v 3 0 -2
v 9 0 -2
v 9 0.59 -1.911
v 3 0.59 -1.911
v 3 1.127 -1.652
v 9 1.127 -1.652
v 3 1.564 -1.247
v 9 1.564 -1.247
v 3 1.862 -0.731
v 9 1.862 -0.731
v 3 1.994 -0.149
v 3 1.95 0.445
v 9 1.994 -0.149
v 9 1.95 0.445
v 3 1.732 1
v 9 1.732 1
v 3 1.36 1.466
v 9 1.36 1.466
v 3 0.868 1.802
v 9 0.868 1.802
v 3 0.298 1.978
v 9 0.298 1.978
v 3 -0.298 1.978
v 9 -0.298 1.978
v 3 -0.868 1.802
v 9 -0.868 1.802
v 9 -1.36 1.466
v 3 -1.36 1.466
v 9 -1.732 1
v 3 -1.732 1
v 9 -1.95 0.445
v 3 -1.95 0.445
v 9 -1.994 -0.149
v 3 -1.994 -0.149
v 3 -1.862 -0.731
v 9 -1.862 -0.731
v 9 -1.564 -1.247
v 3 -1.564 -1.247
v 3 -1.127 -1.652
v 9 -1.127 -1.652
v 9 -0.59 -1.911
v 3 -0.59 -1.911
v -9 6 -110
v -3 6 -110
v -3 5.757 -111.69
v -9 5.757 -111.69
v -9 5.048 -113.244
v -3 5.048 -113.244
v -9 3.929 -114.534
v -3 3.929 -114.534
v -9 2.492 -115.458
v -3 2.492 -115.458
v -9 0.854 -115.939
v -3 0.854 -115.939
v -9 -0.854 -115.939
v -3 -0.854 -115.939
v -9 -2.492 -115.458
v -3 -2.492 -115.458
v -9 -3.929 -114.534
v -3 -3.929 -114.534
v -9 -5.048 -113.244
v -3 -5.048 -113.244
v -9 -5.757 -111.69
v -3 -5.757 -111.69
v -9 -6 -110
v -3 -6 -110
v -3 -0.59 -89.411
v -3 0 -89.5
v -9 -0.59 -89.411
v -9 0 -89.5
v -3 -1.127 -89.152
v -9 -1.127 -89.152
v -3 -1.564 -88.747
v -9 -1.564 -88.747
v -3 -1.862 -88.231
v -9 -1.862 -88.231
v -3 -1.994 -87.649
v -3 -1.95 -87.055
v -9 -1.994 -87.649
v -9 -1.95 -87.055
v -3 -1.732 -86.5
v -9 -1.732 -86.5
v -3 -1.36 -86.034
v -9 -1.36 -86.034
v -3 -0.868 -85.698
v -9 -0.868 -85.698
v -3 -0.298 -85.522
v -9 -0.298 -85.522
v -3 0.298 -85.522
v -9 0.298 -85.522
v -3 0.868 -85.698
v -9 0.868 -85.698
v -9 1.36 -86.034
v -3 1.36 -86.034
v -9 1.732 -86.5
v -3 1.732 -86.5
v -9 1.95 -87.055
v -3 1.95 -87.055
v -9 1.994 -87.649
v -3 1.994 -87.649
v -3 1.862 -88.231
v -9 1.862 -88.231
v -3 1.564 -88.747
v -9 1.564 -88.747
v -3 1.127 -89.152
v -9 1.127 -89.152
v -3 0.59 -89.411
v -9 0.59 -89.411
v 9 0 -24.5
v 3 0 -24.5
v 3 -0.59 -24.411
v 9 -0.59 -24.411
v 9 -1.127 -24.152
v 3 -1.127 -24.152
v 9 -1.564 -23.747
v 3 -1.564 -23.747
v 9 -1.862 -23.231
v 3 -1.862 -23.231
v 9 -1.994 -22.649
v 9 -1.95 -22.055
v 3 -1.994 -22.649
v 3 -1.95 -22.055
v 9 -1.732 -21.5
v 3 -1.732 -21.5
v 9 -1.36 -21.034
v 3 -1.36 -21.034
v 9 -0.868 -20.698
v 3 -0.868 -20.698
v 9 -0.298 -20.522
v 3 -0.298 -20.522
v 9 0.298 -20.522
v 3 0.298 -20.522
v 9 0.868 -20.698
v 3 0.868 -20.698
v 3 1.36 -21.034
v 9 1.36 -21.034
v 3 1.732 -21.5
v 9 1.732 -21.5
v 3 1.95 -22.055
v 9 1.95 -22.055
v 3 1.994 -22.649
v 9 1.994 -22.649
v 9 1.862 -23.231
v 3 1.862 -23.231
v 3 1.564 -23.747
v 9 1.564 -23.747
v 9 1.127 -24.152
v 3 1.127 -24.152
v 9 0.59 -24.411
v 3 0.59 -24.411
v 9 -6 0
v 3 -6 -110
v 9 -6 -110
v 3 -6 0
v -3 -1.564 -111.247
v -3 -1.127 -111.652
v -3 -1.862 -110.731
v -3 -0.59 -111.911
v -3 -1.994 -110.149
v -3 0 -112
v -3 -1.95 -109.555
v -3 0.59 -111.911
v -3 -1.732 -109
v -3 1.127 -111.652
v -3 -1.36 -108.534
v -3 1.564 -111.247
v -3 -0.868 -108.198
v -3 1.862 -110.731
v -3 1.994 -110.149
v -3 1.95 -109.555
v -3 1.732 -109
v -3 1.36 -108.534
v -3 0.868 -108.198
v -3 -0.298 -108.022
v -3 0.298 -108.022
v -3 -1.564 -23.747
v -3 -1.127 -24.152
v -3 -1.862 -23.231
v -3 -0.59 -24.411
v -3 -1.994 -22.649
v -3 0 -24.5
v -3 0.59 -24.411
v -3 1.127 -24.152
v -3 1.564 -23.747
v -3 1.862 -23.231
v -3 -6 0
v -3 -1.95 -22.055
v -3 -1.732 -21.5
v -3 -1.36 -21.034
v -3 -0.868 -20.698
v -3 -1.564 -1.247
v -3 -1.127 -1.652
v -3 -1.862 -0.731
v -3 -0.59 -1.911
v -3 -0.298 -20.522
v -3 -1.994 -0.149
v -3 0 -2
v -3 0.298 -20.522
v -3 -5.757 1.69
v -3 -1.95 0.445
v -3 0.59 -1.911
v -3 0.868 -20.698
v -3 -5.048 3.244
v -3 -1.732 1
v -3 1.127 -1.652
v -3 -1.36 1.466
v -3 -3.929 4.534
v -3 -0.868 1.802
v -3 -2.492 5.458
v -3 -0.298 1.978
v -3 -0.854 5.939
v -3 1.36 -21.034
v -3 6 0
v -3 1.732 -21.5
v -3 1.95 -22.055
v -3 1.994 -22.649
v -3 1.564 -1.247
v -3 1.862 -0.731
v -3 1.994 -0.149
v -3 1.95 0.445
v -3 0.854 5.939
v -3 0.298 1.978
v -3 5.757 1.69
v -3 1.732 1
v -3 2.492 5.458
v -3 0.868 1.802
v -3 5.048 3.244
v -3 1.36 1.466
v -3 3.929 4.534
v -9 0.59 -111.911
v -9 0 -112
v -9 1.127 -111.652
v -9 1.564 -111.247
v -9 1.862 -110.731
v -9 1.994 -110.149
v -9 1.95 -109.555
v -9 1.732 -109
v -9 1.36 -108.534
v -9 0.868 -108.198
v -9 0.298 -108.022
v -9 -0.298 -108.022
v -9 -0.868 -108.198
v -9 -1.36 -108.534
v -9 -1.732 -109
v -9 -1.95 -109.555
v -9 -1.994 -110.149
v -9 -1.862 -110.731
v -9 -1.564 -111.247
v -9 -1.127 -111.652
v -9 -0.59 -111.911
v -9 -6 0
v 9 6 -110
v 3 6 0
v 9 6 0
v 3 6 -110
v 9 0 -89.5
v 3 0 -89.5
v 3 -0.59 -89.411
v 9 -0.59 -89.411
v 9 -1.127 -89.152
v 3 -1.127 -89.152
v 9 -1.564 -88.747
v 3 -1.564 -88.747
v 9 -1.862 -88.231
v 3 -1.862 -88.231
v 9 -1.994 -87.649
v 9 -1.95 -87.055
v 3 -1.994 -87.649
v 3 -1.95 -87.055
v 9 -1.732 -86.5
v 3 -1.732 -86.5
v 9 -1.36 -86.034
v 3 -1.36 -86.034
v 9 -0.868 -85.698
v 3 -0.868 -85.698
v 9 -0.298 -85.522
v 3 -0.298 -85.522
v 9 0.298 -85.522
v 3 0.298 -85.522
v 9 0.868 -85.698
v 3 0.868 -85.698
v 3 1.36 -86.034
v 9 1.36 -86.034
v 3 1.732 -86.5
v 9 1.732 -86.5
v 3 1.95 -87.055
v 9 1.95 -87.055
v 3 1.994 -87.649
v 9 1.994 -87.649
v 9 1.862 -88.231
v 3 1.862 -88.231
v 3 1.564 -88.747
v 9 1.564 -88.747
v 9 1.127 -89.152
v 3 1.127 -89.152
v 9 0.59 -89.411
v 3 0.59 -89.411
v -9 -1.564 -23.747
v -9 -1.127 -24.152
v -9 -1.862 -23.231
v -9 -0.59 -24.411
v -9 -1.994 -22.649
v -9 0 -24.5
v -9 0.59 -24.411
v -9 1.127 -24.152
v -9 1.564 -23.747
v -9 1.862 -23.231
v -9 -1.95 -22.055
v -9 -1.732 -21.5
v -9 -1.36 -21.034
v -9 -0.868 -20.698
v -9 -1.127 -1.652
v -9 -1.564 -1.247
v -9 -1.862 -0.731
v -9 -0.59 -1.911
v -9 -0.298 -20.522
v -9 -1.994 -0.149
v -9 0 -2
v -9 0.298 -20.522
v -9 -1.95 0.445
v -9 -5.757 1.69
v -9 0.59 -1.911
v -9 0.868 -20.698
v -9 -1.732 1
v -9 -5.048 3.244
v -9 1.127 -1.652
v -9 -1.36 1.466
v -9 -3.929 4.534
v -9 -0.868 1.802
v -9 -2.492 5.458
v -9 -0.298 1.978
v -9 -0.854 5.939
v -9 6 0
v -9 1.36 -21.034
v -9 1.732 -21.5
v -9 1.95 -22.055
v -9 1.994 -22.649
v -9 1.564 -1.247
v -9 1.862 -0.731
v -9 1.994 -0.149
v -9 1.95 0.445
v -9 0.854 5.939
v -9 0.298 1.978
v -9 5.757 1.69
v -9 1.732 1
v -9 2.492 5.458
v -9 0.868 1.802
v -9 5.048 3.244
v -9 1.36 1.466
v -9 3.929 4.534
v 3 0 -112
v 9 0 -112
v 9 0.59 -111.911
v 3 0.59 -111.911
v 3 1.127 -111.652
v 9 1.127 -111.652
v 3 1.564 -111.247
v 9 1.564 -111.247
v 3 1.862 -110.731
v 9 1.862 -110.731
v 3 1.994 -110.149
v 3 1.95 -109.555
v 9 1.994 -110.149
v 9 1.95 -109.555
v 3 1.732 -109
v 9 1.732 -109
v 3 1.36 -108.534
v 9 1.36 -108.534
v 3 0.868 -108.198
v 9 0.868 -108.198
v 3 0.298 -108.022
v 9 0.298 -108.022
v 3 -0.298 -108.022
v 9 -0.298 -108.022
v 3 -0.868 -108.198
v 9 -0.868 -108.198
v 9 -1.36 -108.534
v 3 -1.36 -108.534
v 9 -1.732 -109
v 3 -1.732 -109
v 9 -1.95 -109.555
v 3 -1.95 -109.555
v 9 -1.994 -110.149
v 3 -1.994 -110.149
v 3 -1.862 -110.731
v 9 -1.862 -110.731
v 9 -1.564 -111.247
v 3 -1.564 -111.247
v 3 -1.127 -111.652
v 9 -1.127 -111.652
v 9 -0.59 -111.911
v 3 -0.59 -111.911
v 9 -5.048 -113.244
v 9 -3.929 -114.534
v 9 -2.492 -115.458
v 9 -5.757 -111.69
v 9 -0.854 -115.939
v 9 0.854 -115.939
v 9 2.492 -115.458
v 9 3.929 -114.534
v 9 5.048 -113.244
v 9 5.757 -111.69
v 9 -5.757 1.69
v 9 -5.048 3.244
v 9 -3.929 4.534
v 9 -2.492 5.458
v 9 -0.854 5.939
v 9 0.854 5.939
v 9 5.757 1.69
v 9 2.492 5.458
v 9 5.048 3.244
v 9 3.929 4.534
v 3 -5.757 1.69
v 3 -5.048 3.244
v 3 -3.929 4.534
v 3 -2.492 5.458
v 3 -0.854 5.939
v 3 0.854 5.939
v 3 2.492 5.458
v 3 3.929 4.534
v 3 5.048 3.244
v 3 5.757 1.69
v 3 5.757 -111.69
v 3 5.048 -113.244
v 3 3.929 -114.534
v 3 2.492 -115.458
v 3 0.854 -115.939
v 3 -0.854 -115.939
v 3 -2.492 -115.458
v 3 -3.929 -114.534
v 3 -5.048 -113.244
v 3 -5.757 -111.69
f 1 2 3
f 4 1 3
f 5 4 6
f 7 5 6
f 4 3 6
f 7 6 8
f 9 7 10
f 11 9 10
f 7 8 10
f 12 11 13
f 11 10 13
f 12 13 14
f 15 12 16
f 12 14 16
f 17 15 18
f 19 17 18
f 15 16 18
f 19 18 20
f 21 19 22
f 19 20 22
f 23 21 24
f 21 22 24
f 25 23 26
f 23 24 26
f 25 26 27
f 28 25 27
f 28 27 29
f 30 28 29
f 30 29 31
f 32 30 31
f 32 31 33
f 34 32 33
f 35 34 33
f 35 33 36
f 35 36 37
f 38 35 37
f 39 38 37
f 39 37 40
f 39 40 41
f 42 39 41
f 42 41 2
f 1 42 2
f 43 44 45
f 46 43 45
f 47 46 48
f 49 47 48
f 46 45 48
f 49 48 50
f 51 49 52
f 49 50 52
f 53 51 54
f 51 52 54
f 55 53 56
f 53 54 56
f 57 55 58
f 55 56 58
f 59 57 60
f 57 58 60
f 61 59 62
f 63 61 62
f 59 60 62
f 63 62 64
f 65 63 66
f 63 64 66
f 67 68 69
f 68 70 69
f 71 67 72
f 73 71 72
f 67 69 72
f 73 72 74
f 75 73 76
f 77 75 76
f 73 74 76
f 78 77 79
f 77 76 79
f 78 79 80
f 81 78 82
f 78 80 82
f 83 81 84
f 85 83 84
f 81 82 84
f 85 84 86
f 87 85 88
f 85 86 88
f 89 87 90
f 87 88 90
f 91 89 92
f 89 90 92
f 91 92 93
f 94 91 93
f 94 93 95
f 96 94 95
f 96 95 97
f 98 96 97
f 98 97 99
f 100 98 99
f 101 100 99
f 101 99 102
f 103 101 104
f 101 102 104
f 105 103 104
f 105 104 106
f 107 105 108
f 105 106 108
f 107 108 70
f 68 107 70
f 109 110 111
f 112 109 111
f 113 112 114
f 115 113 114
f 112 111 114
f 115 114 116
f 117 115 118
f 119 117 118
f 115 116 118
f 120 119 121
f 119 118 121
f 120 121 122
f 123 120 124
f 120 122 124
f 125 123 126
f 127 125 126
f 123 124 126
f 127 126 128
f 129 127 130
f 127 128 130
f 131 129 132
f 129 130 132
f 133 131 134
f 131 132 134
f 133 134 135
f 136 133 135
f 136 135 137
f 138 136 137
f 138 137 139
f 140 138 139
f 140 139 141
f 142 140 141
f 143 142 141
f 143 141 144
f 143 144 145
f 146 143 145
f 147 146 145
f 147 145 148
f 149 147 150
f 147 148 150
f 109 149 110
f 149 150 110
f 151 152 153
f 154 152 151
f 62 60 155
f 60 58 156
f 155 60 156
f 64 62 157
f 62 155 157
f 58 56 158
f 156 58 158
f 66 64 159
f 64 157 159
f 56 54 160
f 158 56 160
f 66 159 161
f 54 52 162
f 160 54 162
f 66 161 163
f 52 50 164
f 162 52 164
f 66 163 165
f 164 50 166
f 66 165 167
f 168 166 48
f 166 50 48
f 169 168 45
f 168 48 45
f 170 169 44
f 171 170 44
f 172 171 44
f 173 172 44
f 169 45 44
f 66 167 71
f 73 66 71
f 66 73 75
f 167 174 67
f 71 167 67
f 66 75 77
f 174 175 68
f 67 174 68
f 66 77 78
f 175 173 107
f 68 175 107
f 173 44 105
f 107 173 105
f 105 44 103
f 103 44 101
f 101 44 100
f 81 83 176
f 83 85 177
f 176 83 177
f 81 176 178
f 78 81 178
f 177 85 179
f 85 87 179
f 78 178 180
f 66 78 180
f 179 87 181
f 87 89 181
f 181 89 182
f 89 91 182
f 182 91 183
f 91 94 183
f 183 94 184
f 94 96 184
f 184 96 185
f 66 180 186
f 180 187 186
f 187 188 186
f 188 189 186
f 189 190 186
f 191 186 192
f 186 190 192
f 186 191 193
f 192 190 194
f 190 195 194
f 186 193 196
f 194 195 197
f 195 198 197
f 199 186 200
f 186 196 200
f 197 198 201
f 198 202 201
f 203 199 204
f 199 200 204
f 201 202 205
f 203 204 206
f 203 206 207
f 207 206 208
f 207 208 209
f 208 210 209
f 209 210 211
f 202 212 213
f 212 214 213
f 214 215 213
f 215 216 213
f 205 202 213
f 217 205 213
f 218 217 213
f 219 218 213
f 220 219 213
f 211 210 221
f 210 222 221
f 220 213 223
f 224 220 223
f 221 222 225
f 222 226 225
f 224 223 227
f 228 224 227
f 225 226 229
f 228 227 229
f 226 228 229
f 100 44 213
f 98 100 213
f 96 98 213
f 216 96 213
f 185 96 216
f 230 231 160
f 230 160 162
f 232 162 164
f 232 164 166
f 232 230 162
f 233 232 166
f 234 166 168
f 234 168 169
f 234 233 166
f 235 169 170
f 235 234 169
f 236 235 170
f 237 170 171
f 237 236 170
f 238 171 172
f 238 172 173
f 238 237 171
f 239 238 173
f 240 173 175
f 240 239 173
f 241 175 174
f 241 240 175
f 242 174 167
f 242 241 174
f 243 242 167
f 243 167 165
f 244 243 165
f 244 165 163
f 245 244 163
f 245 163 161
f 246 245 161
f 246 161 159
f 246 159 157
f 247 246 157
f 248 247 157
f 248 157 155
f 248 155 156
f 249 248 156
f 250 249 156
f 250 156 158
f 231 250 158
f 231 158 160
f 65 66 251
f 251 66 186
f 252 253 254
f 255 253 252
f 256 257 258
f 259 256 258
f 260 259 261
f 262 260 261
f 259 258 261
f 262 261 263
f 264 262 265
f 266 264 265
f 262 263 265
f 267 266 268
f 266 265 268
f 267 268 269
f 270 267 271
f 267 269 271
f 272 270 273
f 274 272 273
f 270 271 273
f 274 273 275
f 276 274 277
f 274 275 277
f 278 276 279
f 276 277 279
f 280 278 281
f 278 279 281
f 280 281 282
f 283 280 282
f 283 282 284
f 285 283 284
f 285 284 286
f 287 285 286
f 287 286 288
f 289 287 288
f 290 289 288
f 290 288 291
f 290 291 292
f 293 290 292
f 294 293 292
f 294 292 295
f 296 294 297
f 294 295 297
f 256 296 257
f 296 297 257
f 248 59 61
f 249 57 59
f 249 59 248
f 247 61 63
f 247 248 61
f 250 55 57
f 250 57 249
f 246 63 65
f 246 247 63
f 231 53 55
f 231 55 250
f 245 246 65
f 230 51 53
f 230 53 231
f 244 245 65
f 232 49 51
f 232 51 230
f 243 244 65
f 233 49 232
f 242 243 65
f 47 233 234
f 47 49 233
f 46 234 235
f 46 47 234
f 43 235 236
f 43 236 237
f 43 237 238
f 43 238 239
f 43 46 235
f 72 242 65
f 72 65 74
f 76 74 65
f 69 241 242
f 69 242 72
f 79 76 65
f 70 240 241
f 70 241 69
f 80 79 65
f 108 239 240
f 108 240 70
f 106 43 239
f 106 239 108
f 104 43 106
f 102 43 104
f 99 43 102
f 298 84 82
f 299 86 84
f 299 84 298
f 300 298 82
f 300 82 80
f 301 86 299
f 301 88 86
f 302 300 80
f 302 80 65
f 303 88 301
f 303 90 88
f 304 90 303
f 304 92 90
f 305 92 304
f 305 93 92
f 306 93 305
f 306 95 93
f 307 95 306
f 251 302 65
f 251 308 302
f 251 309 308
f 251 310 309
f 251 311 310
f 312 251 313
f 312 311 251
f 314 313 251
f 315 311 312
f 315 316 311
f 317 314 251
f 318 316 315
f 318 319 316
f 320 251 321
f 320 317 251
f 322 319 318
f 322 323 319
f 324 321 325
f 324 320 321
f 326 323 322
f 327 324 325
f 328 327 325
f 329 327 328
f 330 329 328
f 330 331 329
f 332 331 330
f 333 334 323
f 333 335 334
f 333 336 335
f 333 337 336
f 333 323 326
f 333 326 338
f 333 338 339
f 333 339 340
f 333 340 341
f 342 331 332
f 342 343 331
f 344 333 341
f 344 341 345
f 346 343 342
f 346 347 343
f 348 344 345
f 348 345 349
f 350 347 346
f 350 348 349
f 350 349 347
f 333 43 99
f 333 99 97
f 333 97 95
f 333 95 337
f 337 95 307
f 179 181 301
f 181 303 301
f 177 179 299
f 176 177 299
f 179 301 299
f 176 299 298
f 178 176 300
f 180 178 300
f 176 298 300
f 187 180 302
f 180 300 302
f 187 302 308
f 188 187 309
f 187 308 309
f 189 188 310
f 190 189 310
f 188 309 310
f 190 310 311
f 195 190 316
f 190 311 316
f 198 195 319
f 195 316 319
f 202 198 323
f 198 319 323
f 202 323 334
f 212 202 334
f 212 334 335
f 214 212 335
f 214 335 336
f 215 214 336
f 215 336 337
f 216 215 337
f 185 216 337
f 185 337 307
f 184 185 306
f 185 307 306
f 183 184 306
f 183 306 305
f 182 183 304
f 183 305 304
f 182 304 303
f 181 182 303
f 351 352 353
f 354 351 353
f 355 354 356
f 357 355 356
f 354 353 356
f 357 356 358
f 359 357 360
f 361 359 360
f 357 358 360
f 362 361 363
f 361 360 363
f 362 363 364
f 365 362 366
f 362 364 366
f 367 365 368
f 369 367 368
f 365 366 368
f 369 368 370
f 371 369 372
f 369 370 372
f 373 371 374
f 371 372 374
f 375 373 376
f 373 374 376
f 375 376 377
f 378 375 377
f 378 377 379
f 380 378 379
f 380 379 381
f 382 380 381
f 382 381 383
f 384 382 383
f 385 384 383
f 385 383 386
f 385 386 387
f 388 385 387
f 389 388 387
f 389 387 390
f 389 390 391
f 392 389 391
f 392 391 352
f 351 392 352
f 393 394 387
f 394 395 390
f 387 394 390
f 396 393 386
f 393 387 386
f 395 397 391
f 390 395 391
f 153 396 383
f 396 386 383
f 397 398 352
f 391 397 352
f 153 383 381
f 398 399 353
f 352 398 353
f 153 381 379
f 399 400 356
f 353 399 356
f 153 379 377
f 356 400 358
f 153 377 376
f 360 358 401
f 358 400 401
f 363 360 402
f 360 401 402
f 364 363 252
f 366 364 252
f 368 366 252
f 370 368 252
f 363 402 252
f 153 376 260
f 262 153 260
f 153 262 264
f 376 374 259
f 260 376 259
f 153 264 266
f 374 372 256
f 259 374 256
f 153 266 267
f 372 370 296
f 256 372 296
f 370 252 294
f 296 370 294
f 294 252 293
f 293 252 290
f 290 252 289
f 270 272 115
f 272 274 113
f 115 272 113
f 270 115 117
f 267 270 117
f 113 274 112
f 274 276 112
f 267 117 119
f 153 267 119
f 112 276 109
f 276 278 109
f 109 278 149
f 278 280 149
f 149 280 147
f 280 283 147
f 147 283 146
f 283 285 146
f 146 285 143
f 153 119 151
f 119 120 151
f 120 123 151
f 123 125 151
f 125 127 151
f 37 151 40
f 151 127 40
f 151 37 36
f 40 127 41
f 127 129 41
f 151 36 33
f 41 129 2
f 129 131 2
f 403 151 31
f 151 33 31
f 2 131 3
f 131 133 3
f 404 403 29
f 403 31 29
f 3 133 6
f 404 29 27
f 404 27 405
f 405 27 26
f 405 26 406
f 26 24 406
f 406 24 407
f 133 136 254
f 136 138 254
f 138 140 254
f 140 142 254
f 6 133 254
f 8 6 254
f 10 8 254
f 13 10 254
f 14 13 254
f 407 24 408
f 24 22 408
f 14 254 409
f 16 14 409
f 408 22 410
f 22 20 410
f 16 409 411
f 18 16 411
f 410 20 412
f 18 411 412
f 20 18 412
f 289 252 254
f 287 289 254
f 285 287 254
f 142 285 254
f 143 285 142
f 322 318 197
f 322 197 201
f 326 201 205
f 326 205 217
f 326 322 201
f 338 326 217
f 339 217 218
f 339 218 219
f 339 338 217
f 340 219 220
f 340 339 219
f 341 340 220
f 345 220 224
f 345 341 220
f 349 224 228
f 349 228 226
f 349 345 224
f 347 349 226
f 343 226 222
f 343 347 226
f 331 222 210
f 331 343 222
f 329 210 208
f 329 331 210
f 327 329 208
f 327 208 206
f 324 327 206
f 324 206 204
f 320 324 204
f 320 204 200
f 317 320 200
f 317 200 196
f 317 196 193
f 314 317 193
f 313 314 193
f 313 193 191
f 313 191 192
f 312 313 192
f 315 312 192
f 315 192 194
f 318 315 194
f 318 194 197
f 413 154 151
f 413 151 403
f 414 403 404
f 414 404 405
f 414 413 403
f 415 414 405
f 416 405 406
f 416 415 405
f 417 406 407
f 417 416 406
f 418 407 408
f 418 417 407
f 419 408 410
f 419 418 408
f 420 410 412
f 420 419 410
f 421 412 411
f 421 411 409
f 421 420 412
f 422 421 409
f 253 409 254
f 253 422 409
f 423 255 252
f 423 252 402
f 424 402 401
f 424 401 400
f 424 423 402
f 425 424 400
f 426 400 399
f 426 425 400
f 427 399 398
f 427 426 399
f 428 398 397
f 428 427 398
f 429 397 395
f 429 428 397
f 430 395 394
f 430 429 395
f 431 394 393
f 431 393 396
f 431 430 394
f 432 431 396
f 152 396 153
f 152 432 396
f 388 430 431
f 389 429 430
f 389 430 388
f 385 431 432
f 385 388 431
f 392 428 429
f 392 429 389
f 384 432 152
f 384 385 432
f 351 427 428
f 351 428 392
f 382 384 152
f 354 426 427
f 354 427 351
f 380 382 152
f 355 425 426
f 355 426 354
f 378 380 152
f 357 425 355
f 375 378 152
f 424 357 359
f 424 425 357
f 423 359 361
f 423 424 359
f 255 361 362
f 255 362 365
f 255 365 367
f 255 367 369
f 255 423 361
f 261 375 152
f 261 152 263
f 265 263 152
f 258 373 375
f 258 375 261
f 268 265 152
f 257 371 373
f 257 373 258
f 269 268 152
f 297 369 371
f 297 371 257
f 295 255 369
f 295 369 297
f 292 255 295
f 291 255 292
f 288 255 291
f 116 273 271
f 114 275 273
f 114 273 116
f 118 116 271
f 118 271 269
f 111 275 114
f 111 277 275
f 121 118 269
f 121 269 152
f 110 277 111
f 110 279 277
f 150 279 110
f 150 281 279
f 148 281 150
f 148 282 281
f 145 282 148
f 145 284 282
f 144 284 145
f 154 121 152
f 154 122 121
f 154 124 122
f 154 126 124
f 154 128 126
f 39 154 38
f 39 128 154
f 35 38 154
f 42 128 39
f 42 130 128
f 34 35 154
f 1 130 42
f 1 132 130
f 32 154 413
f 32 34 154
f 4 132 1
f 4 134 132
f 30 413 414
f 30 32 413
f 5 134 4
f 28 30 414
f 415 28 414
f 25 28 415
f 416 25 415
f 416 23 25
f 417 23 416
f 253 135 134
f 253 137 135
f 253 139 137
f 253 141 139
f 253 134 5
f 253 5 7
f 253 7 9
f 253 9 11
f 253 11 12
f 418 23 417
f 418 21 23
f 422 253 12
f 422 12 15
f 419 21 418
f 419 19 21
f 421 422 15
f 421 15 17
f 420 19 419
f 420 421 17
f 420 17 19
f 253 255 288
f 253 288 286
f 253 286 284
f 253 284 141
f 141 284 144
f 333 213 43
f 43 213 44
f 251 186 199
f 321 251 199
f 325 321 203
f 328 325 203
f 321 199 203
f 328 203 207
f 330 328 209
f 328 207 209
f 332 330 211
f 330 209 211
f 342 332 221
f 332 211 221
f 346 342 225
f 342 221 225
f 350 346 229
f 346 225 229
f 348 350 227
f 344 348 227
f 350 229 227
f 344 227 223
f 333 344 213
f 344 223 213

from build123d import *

# Parameters (mm, degrees)
BOSS_EXTRUDE1_DEPTH            = 6
SKETCH2_R                      = 2
CUT_EXTRUDE1_DEPTH             = 1
CUT_EXTRUDE1_DEPTH_BACK        = 7
SKETCH6_W                      = 2
SKETCH6_H                      = 18
F_4_0MM_DOWEL_HOLE1_AT_2_COUNT = 2
F_4_0MM_DOWEL_HOLE1_AT_2_PITCH = 65


with BuildPart() as part:
    # Sketch1 → Boss-Extrude1 (new body)
    with BuildSketch(Plane(origin=(3, 0, 0), x_dir=(0, 0, -1), z_dir=(1, 0, 0))):
        with BuildLine():
            Line((0, 6), (110, 6))
            ThreePointArc((110, 6), (116, 0), (110, -6))
            Line((110, -6), (0, -6))
            ThreePointArc((0, -6), (-6, 0), (0, 6))
        make_face()
    extrude(amount=BOSS_EXTRUDE1_DEPTH)

    # Sketch2 → Cut-Extrude1 (cut, two sides)
    with BuildSketch(Plane(origin=(9, 0, 0), x_dir=(0, 0, -1), z_dir=(1, 0, 0))) as cut_extrude1_sk:
        Circle(SKETCH2_R)
        with Locations((110, 0)):
            Circle(SKETCH2_R)
    extrude(amount=CUT_EXTRUDE1_DEPTH, mode=Mode.SUBTRACT)
    extrude(cut_extrude1_sk.sketch, amount=-CUT_EXTRUDE1_DEPTH_BACK, mode=Mode.SUBTRACT)


with BuildPart() as body_2:
    # Mirror4: mirrored copy
    add(part.part.mirror(Plane(origin=(0, 0, 0), x_dir=(0, 0, 1), z_dir=(1, 0, 0))))


with BuildPart() as f_4_0mm_dowel_hole1_tool:
    # Sketch6 → Ø4.0mm Dowel Hole1 (revolve)
    with BuildSketch(Plane(origin=(9, 0, -87.5), x_dir=(0, 0, -1), z_dir=(0, 1, 0))):
        with Locations((1, 9)):
            Rectangle(SKETCH6_W, SKETCH6_H)
    f_4_0mm_dowel_hole1 = revolve(axis=Axis((15.35, 0, -87.5), (-1, 0, 0)))


with BuildPart() as part_1:
    add(part.part)

    # Ø4.0mm Dowel Hole1: cut by f_4_0mm_dowel_hole1_tool
    add(f_4_0mm_dowel_hole1_tool.part, mode=Mode.SUBTRACT)


with BuildPart() as body_2_1:
    add(body_2.part)

    # Ø4.0mm Dowel Hole1: cut by f_4_0mm_dowel_hole1_tool
    add(f_4_0mm_dowel_hole1_tool.part, mode=Mode.SUBTRACT)


with BuildPart() as f_4_0mm_dowel_hole1_at_2_tool:
    # Ø4.0mm Dowel Hole1 at 2: Ø4.0mm Dowel Hole1 ×2
    with Locations(*[(0, 0, i * F_4_0MM_DOWEL_HOLE1_AT_2_PITCH) for i in range(1, F_4_0MM_DOWEL_HOLE1_AT_2_COUNT)]):
        add(f_4_0mm_dowel_hole1)


with BuildPart() as part_2:
    add(part_1.part)

    # Ø4.0mm Dowel Hole1 at 2: cut by f_4_0mm_dowel_hole1_at_2_tool
    add(f_4_0mm_dowel_hole1_at_2_tool.part, mode=Mode.SUBTRACT)


with BuildPart() as body_2_2:
    add(body_2_1.part)

    # Ø4.0mm Dowel Hole1 at 2: cut by f_4_0mm_dowel_hole1_at_2_tool
    add(f_4_0mm_dowel_hole1_at_2_tool.part, mode=Mode.SUBTRACT)


solid = Compound([part_2.part, body_2_2.part])
